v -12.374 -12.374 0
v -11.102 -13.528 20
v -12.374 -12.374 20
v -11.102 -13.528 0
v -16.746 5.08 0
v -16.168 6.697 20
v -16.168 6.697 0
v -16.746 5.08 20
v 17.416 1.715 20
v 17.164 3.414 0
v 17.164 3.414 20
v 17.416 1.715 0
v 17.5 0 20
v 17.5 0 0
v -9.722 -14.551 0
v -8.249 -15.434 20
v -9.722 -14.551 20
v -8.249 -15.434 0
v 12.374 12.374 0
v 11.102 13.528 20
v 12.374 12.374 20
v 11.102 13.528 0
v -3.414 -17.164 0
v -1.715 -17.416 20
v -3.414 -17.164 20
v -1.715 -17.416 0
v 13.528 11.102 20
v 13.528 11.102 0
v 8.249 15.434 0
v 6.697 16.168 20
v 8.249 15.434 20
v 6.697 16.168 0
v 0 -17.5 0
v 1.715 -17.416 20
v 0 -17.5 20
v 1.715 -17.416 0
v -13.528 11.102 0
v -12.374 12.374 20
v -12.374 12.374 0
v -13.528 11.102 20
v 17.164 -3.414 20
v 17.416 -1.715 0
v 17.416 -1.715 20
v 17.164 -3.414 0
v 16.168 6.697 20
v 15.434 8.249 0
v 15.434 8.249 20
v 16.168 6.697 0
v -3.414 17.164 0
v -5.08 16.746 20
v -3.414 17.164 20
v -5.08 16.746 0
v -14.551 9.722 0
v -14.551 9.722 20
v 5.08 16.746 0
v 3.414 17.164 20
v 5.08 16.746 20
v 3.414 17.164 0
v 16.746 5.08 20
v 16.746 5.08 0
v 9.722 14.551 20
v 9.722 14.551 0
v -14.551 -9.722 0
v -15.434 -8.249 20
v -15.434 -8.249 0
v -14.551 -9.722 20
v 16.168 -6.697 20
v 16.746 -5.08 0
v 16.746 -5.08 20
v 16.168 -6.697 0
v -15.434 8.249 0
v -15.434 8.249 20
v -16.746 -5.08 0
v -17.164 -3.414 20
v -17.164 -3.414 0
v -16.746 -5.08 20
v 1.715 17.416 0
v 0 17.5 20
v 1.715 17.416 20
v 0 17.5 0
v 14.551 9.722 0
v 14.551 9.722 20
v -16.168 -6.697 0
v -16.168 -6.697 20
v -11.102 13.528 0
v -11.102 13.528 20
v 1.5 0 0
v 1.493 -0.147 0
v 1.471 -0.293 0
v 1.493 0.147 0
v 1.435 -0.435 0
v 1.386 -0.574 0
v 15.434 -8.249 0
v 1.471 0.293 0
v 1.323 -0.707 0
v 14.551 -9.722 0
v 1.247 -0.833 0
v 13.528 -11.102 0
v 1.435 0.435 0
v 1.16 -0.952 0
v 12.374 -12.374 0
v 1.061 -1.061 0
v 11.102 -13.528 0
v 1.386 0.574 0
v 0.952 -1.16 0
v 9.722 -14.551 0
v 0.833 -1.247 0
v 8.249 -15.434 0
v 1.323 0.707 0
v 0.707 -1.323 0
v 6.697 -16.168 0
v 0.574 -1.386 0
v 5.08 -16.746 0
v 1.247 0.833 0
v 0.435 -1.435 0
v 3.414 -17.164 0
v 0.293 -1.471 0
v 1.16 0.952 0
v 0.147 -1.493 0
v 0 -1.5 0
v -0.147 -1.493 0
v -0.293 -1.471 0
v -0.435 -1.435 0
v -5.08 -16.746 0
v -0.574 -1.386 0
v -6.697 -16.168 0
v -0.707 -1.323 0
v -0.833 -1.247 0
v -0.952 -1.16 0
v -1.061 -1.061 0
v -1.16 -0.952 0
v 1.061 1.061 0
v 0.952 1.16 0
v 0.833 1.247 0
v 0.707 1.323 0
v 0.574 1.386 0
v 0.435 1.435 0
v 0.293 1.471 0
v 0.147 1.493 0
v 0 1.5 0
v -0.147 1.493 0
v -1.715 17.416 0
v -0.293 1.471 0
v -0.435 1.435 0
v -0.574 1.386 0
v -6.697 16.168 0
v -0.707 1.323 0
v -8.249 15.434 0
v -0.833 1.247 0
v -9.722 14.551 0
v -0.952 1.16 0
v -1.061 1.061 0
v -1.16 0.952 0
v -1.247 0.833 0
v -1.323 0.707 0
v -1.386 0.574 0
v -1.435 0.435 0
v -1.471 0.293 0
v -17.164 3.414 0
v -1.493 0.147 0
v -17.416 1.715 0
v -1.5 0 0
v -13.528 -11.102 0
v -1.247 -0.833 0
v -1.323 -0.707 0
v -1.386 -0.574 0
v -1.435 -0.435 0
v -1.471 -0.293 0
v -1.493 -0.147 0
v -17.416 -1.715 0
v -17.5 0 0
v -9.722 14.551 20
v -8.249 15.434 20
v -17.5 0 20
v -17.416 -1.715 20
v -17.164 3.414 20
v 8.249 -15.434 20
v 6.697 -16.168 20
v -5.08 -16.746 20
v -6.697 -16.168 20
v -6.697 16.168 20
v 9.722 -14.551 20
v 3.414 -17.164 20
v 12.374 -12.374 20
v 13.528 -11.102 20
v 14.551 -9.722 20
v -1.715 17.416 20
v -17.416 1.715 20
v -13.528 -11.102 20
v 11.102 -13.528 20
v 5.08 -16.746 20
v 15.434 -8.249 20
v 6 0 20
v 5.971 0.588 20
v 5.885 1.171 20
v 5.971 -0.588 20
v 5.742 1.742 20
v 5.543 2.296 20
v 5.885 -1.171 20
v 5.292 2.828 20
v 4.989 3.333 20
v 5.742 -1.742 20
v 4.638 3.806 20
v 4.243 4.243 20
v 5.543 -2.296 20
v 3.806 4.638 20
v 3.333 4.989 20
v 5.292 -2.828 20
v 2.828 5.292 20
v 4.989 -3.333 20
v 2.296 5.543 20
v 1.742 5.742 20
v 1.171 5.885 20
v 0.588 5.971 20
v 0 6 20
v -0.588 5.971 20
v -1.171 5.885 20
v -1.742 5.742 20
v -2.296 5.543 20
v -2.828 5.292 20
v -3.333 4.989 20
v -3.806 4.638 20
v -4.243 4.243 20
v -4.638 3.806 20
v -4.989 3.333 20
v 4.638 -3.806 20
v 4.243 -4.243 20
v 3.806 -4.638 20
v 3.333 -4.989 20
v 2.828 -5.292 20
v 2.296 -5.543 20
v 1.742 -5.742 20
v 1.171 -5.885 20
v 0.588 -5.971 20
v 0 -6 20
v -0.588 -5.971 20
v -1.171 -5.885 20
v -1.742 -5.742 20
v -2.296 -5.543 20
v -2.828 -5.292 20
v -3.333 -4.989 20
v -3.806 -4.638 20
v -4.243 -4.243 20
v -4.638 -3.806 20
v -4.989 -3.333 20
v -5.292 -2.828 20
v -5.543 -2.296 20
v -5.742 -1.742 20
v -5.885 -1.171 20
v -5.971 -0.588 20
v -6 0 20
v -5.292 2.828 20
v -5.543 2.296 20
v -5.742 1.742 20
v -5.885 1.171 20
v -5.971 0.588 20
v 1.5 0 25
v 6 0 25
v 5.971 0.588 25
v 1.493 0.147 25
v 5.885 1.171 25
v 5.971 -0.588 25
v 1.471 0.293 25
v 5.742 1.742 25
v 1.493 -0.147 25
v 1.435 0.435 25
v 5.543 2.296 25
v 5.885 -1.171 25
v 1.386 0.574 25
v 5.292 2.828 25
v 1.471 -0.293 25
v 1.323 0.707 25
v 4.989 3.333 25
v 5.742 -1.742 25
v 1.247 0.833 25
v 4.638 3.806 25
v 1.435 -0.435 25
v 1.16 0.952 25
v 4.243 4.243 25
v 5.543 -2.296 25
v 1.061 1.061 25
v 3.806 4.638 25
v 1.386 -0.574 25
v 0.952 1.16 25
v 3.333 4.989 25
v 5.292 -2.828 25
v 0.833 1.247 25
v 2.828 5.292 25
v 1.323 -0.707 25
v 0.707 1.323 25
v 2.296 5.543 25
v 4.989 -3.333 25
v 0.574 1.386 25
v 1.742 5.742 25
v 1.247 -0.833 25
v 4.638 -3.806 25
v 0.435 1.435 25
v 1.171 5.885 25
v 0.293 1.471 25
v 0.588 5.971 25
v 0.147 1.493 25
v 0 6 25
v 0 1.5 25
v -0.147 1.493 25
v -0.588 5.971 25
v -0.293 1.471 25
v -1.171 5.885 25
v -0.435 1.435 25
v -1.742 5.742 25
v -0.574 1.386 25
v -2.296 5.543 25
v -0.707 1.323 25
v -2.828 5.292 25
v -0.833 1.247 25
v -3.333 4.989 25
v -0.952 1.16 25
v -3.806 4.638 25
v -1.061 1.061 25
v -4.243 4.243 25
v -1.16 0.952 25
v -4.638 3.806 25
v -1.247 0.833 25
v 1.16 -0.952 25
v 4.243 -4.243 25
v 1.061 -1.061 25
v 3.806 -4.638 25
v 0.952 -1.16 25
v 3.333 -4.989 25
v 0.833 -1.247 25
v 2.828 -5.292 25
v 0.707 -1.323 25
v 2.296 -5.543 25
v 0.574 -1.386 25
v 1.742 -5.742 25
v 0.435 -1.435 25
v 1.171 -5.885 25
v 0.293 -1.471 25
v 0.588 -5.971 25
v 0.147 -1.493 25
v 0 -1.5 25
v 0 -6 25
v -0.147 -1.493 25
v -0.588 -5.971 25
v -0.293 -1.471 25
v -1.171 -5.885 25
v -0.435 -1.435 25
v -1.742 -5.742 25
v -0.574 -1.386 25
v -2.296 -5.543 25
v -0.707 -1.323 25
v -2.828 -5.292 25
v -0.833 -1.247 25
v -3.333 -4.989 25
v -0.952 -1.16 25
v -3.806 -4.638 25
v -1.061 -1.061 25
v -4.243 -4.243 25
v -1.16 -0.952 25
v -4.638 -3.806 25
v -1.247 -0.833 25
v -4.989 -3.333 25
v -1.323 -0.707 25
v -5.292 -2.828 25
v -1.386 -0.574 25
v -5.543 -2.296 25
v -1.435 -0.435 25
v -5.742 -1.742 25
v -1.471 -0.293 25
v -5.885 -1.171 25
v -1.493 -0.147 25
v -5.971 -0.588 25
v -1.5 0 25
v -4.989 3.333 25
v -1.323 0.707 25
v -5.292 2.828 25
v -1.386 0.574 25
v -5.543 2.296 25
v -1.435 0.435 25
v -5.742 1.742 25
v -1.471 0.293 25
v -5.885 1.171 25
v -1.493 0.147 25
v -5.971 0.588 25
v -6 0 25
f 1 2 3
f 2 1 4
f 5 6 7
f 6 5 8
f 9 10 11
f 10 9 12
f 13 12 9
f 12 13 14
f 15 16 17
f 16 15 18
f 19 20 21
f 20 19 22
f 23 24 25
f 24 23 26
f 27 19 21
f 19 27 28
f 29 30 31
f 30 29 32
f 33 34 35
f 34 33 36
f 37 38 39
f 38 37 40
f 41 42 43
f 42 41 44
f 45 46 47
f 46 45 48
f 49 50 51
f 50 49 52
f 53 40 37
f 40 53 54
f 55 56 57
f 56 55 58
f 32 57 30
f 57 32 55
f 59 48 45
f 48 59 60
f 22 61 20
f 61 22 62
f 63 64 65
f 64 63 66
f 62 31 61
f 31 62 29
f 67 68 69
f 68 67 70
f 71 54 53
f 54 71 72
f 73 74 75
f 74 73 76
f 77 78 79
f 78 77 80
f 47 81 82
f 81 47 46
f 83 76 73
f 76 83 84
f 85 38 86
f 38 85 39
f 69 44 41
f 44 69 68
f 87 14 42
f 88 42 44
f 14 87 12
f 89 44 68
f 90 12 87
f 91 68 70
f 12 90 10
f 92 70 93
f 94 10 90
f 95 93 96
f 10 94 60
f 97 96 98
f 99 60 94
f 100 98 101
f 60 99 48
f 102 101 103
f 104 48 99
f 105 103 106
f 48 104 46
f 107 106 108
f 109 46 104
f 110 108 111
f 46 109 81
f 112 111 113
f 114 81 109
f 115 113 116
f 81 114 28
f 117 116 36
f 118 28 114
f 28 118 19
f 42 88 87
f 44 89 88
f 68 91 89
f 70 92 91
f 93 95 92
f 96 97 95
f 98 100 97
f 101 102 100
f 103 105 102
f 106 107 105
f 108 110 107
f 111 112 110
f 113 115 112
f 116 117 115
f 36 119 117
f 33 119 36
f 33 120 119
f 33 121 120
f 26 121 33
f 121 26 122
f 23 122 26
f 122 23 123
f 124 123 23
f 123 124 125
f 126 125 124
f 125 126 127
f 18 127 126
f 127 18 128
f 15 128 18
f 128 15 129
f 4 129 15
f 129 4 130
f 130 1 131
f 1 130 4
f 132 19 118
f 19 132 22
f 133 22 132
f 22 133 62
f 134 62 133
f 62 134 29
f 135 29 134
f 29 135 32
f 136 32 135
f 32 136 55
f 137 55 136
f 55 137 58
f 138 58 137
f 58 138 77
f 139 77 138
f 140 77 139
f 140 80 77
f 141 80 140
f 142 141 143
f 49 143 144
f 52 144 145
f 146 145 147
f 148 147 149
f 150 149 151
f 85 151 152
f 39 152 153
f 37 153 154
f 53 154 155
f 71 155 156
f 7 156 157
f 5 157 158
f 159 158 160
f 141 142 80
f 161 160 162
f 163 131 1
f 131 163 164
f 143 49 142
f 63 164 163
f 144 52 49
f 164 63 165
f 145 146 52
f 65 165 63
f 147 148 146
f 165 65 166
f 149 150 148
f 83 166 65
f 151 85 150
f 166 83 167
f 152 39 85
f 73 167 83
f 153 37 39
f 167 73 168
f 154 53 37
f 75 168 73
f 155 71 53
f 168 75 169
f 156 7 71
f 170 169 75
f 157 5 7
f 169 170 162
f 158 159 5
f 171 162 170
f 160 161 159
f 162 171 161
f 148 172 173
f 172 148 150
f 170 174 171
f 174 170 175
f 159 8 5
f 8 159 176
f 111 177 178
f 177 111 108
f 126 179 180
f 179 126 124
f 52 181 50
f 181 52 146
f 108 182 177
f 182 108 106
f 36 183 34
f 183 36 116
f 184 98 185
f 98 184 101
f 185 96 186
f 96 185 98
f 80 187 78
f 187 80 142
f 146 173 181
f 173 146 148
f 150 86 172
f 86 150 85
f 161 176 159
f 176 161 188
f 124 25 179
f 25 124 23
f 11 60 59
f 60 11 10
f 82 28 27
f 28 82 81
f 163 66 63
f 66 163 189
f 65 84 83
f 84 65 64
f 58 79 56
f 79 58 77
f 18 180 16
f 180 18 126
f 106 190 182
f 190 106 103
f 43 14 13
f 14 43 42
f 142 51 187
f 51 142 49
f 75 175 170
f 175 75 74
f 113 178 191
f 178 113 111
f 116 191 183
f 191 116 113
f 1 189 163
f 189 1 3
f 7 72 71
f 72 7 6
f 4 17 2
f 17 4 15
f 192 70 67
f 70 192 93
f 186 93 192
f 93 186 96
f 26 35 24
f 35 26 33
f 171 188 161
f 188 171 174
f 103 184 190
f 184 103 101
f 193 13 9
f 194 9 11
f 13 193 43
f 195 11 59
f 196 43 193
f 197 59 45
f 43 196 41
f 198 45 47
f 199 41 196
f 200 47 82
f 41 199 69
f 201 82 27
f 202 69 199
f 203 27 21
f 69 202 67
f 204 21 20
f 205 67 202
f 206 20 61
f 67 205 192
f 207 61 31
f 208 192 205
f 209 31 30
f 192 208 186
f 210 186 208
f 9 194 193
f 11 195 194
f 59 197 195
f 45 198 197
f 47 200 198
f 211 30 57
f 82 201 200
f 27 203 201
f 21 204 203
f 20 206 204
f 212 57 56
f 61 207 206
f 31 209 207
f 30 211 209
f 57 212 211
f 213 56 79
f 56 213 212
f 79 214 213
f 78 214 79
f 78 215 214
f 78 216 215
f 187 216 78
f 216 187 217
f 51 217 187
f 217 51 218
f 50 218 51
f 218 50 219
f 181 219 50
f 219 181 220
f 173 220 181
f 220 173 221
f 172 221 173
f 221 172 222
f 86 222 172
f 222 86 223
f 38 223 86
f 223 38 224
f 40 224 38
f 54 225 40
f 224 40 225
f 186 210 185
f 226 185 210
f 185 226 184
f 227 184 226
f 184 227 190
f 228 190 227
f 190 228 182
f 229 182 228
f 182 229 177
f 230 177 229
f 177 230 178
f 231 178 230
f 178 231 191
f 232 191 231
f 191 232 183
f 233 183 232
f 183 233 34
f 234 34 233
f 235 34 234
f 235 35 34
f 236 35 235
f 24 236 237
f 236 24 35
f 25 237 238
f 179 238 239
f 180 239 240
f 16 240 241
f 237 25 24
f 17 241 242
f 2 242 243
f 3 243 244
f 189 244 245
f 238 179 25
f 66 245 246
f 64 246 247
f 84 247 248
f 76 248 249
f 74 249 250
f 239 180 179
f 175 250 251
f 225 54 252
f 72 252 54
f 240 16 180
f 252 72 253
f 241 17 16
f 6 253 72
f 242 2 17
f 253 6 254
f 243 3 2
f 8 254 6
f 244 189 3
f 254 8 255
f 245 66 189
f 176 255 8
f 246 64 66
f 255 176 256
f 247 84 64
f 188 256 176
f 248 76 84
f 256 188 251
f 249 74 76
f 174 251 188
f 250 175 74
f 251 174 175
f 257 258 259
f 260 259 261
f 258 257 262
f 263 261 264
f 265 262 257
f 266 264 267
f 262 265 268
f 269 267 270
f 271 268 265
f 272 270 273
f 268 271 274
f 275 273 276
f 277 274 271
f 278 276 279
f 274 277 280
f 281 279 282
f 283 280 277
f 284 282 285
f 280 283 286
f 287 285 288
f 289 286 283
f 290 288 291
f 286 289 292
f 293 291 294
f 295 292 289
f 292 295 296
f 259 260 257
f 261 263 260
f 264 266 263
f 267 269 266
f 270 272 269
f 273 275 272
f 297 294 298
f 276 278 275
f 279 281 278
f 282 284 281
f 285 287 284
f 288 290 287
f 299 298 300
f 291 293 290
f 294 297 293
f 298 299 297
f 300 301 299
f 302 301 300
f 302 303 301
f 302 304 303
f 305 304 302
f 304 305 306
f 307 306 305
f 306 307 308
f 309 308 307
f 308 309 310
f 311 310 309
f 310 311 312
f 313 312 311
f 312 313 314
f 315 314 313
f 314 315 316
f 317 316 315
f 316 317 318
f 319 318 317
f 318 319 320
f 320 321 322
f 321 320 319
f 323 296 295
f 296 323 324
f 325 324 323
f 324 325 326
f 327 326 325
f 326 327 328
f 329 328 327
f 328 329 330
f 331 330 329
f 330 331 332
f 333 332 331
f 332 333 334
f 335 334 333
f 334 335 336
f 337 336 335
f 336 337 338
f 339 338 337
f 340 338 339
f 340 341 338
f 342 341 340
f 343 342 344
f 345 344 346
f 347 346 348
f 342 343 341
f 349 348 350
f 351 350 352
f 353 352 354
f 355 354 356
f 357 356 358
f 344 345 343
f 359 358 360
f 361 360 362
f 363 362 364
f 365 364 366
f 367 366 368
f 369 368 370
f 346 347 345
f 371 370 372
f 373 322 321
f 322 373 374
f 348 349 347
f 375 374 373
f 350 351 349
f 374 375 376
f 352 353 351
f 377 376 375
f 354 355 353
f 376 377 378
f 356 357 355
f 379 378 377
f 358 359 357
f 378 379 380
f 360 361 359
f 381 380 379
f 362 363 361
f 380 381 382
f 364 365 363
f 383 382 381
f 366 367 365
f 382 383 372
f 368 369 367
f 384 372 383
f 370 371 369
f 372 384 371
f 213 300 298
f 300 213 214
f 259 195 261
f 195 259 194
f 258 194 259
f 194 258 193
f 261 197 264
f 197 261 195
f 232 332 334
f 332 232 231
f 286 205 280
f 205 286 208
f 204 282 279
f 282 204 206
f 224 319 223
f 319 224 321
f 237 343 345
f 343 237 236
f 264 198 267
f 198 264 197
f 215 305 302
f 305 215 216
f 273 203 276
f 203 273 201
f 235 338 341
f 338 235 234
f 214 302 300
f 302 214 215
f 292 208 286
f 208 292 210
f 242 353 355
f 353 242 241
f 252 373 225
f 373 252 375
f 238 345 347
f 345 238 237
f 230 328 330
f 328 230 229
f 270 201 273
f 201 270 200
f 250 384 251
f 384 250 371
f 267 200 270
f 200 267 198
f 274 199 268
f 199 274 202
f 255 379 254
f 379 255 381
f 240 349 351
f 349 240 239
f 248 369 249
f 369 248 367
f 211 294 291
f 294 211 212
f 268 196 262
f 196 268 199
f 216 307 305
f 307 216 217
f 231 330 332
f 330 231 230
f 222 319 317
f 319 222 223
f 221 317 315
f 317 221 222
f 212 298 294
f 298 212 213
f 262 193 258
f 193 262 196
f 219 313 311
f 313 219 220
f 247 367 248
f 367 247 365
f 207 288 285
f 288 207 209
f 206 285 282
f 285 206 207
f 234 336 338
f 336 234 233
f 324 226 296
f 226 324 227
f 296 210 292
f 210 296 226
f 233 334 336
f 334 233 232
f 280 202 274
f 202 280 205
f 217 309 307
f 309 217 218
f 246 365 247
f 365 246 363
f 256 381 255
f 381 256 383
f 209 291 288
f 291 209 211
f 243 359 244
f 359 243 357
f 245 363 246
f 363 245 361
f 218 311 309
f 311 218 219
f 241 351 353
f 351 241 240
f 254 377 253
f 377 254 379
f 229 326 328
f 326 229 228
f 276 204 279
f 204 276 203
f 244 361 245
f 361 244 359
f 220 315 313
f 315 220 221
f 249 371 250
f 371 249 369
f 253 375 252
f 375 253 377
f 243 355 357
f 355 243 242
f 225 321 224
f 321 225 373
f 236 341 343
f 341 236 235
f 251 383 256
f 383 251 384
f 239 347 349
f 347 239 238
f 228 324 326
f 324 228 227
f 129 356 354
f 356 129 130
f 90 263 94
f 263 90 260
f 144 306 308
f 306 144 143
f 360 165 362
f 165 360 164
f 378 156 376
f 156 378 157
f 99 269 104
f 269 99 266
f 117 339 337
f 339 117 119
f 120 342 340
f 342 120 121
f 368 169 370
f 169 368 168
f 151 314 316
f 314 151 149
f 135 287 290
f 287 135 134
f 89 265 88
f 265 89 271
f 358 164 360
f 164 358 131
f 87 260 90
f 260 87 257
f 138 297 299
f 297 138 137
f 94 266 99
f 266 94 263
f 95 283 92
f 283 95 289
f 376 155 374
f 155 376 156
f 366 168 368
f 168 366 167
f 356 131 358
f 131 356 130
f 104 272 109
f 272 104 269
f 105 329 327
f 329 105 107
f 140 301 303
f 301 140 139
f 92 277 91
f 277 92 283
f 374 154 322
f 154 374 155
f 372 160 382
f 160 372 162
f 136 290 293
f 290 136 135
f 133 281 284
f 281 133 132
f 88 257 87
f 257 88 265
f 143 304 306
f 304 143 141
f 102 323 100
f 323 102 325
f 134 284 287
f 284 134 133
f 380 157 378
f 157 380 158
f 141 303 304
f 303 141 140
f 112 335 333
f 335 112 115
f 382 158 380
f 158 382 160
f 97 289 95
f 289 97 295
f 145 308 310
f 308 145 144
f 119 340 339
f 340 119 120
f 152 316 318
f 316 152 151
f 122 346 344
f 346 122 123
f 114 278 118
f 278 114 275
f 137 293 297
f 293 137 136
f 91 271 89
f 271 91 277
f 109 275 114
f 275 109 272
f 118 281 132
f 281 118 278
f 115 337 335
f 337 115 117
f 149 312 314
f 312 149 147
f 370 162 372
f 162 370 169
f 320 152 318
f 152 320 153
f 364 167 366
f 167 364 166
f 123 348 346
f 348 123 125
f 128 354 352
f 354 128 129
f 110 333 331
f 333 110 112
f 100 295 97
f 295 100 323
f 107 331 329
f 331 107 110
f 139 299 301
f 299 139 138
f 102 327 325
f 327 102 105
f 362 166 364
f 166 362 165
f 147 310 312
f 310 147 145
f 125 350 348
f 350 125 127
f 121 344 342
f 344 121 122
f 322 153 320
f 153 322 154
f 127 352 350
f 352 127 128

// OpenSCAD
// Straight hose-barb reducer: 8 mm tubing -> 5 mm tubing
// Print orientation: standing upright along +Z, centred on origin in X/Y

$fn = 64;

// ---- Dimensions (mm) ----
reducer_length   = 41;   // total length of the part
bore_d           = 3;    // through-bore diameter
first_tubing_d   = 8;    // inner diameter of the larger tubing
second_tubing_d  = 5;    // inner diameter of the smaller tubing
first_barb_h     = 10;   // height of each 8 mm barb
second_barb_h    = 8;    // height of each 5 mm barb
first_barb_od    = 9.5;  // outer diameter of 8 mm barbs at their tops
second_barb_od   = 5.0;  // outer diameter of 5 mm barbs at their tops
collar_d         = 12;   // outer diameter of the collar
overlap          = 0.5;  // overlap between stacked barbs for a clean union

// ---- Derived ----
first_barb_widening = (first_barb_od - 7.5) / 2;   // radius growth per mm of height
second_barb_narrowing = (6.5 - second_barb_od) / 2; // radius shrink per mm of height

difference() {
    union() {
        // ---- 8 mm tubing end (z = 0 to 20) ----
        for (z = [0 : first_barb_h : first_barb_h * 2 - overlap]) {
            translate([0, 0, z])
                cylinder(h = first_barb_h,
                         r = 7.5 + first_barb_widening * first_barb_h,
                         $fn = 64);
        }

        // ---- 5 mm tubing end (z = 25 to 41) ----
        for (z = [25 : second_barb_h : 25 + second_barb_h * 2 - overlap]) {
            translate([0, 0, z])
                cylinder(h = second_barb_h,
                         r = 6.5 - second_barb_narrowing * second_barb_h,
                         $fn = 64);
        }

        // ---- Collar (z = 20 to 25) ----
        translate([0, 0, 20])
            cylinder(h = 5, d = collar_d, $fn = 64);
    }

    // ---- Through bore ----
    translate([0, 0, -1])
        cylinder(h = reducer_length + 2, d = bore_d, $fn = 64);
}
